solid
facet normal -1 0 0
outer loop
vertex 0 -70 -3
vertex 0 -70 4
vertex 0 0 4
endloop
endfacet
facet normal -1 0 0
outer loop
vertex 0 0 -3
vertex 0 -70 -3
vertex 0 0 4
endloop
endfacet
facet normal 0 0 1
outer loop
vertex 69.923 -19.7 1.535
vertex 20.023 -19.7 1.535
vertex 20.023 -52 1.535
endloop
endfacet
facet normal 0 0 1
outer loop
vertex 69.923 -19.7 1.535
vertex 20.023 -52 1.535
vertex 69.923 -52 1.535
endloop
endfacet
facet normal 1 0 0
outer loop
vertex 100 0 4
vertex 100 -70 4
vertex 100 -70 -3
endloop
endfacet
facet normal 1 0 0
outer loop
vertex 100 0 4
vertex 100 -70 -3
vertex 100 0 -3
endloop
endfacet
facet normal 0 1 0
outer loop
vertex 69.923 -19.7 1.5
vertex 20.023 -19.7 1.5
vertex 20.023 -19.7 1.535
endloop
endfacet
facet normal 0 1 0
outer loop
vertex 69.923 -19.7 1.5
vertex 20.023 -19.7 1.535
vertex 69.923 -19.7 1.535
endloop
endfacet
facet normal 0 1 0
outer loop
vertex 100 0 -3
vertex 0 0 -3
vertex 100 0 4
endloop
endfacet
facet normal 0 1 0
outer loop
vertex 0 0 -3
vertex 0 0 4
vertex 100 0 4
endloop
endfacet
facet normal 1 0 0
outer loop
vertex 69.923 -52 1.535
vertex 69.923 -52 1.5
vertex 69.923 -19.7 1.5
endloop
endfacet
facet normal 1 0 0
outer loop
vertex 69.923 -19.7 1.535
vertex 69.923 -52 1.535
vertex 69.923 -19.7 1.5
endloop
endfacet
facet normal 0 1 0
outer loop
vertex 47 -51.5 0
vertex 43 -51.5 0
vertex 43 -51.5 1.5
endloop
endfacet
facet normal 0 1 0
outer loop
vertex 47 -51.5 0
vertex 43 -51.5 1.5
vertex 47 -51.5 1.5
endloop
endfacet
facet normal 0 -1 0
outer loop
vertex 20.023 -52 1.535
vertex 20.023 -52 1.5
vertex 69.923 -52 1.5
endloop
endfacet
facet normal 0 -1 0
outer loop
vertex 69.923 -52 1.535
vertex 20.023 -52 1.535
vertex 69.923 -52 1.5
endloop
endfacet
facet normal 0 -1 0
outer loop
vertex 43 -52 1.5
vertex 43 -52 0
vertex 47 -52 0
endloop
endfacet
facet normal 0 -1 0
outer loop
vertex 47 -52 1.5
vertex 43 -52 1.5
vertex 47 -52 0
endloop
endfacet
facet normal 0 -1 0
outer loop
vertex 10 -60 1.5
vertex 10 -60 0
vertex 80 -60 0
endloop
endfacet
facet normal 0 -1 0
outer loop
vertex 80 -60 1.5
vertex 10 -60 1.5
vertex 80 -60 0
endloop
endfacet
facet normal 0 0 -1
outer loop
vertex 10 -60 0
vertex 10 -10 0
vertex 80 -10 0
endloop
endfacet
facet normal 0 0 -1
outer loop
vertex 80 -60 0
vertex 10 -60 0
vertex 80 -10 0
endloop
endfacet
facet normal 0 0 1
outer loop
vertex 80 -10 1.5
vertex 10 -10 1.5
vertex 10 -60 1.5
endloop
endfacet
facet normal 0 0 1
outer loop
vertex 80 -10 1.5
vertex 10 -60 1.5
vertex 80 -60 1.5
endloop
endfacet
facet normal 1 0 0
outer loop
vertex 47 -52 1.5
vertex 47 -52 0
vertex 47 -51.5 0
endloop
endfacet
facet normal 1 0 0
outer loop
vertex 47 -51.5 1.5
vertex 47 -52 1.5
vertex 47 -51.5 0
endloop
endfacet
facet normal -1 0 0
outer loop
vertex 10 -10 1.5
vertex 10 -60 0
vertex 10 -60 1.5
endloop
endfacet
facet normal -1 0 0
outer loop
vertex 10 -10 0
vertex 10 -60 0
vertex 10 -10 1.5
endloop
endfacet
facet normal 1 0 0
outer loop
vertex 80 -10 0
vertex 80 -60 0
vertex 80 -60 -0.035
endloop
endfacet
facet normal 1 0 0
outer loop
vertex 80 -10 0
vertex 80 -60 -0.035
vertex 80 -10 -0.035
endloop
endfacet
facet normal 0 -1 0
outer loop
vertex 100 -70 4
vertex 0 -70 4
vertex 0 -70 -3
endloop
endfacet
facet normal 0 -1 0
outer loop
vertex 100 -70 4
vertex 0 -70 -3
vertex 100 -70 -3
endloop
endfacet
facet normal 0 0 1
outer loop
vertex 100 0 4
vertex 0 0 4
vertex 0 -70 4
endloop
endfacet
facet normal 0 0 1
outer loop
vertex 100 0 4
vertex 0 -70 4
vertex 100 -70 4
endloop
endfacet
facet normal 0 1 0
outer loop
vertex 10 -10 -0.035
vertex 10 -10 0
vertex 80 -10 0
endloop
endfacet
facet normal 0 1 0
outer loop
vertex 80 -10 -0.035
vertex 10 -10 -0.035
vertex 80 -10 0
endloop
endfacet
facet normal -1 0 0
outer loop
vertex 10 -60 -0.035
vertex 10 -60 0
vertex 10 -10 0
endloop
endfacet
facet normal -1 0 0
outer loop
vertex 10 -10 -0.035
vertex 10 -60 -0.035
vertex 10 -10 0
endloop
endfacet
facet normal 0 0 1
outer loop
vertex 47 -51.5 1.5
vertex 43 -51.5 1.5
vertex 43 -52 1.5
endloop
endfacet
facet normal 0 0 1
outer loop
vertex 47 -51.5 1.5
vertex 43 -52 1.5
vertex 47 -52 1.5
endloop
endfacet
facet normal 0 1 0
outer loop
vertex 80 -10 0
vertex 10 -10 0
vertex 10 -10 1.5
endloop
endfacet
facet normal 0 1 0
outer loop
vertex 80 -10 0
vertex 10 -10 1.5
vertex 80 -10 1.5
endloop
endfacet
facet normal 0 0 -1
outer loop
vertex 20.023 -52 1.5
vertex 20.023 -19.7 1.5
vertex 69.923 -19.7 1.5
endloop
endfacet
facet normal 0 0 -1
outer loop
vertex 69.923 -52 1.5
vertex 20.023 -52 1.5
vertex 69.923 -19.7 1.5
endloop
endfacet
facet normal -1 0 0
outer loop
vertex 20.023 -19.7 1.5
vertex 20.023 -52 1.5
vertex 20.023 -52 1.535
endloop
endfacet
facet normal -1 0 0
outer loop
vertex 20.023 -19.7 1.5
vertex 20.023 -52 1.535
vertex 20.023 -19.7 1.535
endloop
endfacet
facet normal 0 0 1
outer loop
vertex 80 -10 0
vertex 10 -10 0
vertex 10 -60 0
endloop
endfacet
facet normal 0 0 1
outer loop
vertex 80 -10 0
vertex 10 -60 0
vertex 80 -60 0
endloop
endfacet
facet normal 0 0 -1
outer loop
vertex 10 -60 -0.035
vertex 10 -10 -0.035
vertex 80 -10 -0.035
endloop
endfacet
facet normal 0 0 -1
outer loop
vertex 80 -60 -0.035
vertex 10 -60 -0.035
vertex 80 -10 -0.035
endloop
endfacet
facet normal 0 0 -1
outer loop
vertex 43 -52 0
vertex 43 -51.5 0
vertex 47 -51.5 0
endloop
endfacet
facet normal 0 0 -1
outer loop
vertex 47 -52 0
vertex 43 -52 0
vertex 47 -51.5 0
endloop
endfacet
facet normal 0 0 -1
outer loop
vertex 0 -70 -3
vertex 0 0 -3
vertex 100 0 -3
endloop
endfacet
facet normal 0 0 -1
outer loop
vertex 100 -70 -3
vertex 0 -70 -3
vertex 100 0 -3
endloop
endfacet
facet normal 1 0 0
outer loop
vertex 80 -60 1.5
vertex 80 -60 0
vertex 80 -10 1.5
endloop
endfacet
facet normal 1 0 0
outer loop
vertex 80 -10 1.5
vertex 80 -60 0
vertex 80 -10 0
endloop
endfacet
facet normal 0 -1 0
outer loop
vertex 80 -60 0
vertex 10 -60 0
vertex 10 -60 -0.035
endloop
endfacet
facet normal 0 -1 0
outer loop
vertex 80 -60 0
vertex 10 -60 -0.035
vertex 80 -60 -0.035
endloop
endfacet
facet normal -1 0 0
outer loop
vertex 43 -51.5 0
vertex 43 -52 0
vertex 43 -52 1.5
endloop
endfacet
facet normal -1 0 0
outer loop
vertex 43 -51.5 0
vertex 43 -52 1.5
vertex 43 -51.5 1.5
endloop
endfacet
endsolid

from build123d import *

# Parameters (mm, degrees)
RECTANGLE003_W   = 70
RECTANGLE003_H   = 50
EXTRUDE_DEPTH    = 1.5
RECTANGLE001_W   = 4
RECTANGLE001_H   = 0.5
EXTRUDE001_DEPTH = 1.5
RECTANGLE005_W   = 100
RECTANGLE005_H   = 70
EXTRUDE003_DEPTH = 3
RECTANGLE004_W   = 100
RECTANGLE004_H   = 70
EXTRUDE002_DEPTH = 4
RECTANGLE_W      = 49.9
RECTANGLE_H      = 32.3
EXTRUDE004_DEPTH = 0.035
RECTANGLE002_W   = 70
RECTANGLE002_H   = 50
EXTRUDE005_DEPTH = 0.035


with BuildPart() as substrate_box:
    # Rectangle003 → Extrude (new body)
    with BuildSketch(Plane(origin=(10, -60, 0), x_dir=(1, 0, 0), z_dir=(0, 0, 1))):
        with Locations((35, 25)):
            Rectangle(RECTANGLE003_W, RECTANGLE003_H)
    extrude(amount=EXTRUDE_DEPTH)


with BuildPart() as excitation_box:
    # Rectangle001 → Extrude001 (new body)
    with BuildSketch(Plane(origin=(43, -52, 0), x_dir=(1, 0, 0), z_dir=(0, 0, 1))):
        with Locations((2, 0.25)):
            Rectangle(RECTANGLE001_W, RECTANGLE001_H)
    extrude(amount=EXTRUDE001_DEPTH)


with BuildPart() as air_box_bottom:
    # Rectangle005 → Extrude003 (new body)
    with BuildSketch(Plane(origin=(0, -70, 0), x_dir=(1, 0, 0), z_dir=(0, 0, 1))):
        with Locations((50, 35)):
            Rectangle(RECTANGLE005_W, RECTANGLE005_H)
    extrude(amount=-EXTRUDE003_DEPTH)


with BuildPart() as air_box:
    # Rectangle004 → Extrude002 (new body)
    with BuildSketch(Plane(origin=(0, -70, 0), x_dir=(1, 0, 0), z_dir=(0, 0, 1))):
        with Locations((50, 35)):
            Rectangle(RECTANGLE004_W, RECTANGLE004_H)
    extrude(amount=EXTRUDE002_DEPTH)

    # Fusion: union air box bottom
    add(air_box_bottom.part)


with BuildPart() as atnenna:
    # Rectangle → Extrude004 (new body)
    with BuildSketch(Plane(origin=(20.023, -52, 1.5), x_dir=(1, 0, 0), z_dir=(0, 0, 1))):
        with Locations((24.95, 16.15)):
            Rectangle(RECTANGLE_W, RECTANGLE_H)
    extrude(amount=EXTRUDE004_DEPTH)


with BuildPart() as gnd001:
    # Rectangle002 → Extrude005 (new body)
    with BuildSketch(Plane(origin=(10, -60, 0), x_dir=(1, 0, 0), z_dir=(0, 0, 1))):
        with Locations((35, 25)):
            Rectangle(RECTANGLE002_W, RECTANGLE002_H)
    extrude(amount=-EXTRUDE005_DEPTH)


solid = Compound([substrate_box.part, excitation_box.part, air_box.part, atnenna.part, gnd001.part])
